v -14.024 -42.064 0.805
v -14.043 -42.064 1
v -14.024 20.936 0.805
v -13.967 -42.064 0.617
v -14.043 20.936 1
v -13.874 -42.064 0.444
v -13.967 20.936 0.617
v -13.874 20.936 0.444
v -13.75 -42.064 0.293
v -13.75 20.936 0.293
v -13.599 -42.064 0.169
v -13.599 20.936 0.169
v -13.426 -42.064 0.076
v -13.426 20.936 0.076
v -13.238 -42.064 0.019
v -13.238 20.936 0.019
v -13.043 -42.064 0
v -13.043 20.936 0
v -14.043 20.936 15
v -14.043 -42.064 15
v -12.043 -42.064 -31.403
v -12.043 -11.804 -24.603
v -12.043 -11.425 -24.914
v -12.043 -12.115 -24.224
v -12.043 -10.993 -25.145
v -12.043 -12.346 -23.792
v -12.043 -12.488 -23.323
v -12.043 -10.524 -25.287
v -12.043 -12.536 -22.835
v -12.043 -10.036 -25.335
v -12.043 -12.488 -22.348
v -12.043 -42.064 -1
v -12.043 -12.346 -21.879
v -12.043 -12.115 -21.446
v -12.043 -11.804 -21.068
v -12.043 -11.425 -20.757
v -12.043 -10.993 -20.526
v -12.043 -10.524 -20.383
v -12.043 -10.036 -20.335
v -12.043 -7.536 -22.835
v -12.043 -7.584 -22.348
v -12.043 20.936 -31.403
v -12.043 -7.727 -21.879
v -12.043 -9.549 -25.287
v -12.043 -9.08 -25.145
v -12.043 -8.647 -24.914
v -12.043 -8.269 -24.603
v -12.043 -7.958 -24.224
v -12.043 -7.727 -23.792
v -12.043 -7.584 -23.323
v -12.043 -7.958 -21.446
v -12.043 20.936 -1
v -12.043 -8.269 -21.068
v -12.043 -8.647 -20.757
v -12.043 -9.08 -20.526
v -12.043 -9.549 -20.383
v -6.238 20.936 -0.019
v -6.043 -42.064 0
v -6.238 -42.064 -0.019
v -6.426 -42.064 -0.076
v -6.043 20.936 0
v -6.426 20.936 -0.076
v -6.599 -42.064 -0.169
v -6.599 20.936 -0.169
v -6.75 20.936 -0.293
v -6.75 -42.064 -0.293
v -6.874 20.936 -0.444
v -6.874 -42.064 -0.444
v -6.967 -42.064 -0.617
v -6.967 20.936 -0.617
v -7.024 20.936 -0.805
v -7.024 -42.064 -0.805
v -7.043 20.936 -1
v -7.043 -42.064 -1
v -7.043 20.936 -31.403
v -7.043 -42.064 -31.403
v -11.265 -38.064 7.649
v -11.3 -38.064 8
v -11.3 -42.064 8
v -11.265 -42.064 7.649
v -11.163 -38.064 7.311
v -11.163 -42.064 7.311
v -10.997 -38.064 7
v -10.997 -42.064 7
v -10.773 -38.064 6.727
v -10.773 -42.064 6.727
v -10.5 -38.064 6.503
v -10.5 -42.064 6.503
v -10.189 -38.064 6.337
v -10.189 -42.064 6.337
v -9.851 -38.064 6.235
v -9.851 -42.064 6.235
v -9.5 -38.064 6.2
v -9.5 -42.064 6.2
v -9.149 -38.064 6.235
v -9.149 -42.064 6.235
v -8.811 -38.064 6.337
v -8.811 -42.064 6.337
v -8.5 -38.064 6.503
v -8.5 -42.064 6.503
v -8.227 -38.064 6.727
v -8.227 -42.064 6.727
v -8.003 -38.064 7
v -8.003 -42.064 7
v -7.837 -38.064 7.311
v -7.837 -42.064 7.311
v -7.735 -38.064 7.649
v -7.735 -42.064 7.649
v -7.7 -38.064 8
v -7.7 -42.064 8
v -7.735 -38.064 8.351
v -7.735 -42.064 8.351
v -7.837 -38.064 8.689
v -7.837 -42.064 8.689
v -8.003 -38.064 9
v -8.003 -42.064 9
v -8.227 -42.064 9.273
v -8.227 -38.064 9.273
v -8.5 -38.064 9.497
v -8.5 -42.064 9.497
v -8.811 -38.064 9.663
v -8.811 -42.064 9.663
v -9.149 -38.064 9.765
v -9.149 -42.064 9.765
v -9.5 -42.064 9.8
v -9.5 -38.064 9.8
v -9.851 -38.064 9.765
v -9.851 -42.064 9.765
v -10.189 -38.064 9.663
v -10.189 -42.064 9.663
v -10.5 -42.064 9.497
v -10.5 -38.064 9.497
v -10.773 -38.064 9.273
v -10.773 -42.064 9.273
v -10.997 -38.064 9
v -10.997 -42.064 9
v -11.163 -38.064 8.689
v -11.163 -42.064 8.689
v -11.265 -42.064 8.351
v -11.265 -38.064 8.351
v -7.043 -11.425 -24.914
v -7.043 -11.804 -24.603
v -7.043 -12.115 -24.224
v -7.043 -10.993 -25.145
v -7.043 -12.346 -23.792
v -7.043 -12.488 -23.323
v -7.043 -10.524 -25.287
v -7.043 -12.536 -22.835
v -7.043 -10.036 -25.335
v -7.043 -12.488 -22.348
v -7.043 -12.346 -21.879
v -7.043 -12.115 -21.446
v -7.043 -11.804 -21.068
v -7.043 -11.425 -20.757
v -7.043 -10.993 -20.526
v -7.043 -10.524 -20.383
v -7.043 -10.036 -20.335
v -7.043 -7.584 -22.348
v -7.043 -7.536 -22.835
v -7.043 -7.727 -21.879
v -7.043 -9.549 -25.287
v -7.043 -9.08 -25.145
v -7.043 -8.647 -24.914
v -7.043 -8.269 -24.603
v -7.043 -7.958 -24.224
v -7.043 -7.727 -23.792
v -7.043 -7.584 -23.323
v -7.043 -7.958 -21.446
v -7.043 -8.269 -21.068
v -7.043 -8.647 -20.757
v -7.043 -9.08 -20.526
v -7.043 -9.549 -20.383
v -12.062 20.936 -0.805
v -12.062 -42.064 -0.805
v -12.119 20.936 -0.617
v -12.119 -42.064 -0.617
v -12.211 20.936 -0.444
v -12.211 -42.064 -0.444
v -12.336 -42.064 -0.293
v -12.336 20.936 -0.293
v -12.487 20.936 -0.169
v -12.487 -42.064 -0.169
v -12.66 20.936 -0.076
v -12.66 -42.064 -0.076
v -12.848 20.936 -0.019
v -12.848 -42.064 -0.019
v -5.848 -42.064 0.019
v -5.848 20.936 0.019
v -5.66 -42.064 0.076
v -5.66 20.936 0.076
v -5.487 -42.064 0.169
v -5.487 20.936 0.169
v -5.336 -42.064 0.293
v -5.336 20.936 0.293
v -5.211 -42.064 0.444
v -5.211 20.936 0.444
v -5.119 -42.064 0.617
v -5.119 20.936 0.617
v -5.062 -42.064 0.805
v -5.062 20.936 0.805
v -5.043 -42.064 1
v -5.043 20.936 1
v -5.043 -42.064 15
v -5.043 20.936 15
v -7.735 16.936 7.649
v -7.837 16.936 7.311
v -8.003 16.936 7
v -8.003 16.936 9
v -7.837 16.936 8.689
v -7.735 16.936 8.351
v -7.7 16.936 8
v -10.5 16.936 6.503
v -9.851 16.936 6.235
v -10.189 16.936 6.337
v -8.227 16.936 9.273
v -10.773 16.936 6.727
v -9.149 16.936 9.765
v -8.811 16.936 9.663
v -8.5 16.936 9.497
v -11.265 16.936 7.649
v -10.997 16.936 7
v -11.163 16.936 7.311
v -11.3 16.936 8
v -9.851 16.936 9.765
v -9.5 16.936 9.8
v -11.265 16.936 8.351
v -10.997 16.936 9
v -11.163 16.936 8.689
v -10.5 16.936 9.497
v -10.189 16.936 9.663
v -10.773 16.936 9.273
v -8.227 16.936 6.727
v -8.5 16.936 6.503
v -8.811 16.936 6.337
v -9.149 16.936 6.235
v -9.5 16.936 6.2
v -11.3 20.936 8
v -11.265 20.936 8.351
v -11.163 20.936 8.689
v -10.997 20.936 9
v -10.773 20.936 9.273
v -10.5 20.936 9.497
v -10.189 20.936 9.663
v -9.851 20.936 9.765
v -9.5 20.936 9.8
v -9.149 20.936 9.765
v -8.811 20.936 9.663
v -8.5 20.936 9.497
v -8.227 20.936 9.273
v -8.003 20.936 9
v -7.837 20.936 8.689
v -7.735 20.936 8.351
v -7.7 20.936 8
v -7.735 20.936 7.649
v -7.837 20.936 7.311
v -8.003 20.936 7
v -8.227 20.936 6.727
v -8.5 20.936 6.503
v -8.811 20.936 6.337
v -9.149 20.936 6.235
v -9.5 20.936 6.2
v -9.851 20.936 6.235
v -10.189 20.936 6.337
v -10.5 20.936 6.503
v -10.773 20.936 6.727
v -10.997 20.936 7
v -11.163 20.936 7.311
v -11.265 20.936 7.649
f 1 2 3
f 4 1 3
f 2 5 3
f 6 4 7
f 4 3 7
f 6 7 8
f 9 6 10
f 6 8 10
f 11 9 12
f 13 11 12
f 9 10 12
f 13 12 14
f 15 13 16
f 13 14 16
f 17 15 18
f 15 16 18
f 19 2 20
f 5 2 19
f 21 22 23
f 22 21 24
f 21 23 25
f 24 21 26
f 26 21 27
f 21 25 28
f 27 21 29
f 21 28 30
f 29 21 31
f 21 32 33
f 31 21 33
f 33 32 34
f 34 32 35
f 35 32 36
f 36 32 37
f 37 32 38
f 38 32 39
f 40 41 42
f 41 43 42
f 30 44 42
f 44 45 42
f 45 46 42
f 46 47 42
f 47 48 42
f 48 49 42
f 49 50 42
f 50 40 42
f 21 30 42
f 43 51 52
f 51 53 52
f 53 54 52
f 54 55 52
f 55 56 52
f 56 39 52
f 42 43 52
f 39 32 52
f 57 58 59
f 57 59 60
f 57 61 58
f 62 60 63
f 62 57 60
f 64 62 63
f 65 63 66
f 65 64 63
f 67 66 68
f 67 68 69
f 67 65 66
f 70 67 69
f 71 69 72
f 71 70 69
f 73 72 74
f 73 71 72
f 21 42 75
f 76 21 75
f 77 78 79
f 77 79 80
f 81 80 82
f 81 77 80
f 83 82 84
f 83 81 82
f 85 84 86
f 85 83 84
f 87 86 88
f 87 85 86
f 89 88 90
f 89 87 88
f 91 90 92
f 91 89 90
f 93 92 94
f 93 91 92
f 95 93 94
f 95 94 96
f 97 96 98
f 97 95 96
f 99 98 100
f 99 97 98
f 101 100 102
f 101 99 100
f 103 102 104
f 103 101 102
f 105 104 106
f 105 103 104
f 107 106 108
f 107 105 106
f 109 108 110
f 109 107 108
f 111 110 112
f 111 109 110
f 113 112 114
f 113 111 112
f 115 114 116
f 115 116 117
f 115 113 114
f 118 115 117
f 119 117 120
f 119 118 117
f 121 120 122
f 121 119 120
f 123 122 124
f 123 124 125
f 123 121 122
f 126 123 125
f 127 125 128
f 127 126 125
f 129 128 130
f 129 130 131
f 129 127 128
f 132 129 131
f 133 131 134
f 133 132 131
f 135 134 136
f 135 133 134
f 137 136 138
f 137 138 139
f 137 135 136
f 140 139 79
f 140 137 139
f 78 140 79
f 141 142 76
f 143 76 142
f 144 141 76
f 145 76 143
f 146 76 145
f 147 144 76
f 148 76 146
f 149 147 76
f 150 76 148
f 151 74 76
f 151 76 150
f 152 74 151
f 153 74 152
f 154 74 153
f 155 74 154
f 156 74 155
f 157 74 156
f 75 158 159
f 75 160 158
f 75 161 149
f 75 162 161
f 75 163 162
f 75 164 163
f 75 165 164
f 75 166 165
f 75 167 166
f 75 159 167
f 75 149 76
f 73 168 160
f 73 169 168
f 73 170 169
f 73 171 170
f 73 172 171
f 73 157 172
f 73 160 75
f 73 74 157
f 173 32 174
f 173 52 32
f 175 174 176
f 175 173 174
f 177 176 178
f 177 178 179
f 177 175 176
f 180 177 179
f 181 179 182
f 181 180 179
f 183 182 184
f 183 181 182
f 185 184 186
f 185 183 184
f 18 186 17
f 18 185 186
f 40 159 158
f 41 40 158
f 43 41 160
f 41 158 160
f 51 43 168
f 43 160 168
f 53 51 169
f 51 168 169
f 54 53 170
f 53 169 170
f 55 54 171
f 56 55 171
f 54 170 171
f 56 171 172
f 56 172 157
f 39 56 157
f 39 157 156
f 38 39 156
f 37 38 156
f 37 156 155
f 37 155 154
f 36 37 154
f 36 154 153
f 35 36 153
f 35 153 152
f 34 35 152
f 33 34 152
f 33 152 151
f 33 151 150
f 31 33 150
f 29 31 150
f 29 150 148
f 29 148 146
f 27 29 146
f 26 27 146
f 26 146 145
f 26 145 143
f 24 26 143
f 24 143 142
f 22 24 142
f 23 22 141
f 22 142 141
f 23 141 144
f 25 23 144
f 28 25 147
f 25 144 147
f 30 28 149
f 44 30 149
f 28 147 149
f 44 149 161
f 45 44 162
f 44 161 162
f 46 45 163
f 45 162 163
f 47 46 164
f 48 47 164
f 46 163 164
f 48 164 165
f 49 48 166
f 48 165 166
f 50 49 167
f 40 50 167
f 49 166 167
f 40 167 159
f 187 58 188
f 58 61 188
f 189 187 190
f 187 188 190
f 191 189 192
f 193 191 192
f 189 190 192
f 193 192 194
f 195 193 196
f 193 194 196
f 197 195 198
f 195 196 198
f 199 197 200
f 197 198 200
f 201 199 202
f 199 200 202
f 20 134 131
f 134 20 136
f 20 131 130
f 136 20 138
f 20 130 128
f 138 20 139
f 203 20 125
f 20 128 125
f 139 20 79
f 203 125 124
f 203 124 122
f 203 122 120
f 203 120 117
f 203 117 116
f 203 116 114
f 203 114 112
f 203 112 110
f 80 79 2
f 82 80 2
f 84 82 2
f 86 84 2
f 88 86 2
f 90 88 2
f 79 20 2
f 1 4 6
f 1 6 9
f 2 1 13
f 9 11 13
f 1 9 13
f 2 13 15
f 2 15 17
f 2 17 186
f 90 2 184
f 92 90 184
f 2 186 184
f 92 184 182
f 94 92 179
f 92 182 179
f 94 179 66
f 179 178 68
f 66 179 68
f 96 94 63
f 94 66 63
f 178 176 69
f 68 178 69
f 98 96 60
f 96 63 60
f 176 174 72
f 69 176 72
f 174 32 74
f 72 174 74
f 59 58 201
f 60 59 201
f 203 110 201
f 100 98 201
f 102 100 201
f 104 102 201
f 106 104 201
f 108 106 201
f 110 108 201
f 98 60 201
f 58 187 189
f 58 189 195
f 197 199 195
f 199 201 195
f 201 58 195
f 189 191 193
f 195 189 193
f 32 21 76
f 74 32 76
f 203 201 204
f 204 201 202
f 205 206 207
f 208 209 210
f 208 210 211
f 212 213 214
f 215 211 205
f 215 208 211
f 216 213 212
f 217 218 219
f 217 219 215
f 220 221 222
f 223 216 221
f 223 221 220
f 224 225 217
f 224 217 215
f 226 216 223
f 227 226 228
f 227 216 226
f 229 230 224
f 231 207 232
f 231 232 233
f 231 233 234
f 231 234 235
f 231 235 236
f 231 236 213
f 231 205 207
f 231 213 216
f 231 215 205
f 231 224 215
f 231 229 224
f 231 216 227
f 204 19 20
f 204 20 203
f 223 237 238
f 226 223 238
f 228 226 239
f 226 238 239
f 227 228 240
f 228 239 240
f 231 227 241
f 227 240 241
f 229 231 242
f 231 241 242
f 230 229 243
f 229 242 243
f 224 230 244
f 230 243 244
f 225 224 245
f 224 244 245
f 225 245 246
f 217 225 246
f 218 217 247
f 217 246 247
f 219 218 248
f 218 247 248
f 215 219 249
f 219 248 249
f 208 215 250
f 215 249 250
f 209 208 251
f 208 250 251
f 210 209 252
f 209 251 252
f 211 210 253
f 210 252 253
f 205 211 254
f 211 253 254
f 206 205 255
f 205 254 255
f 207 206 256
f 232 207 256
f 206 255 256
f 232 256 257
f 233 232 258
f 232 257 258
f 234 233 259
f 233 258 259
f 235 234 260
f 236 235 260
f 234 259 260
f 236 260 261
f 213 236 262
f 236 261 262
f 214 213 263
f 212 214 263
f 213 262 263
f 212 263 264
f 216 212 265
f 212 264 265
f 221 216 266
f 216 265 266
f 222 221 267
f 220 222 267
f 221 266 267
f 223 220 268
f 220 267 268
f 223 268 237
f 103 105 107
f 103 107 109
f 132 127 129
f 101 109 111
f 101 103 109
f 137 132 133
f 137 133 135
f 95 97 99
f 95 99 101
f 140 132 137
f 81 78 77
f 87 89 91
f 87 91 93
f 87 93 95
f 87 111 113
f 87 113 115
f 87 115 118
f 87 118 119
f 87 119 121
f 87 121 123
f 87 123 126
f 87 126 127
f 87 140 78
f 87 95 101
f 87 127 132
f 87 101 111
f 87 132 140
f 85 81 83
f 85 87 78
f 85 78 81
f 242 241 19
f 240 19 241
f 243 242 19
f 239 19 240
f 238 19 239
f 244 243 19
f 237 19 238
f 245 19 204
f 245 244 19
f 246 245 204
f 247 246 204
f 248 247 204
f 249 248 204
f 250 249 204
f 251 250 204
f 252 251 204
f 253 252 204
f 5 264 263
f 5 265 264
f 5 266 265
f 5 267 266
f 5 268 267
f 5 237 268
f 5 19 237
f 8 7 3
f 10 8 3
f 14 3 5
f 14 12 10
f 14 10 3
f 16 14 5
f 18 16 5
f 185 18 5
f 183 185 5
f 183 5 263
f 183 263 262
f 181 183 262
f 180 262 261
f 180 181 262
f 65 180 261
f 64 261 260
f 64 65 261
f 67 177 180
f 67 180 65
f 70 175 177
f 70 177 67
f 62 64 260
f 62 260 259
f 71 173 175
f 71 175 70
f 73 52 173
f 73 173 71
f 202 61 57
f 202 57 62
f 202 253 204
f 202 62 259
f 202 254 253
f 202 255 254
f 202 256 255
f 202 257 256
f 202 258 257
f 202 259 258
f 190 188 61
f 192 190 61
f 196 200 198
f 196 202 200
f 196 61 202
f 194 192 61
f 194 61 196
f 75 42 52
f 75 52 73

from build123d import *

# Parameters (mm, degrees)
ESQUISSE1_W                  = 9
ESQUISSE1_H                  = 63
BOSS_EXTRU_1_DEPTH           = 10
ESQUISSE2_W                  = 5
ESQUISSE2_H                  = 63
BOSS_EXTRU_2_DEPTH           = 63
CONG_3_R                     = 1
CONG_4_R                     = 1
CONG_5_R                     = 1
CONG_6_R                     = 1
ESQUISSE3_R                  = 2.5
ENL_V_MAT_EXTRU_1_DEPTH      = 77.075062882
ENL_V_MAT_EXTRU_3_DEPTH      = 77.075062882
ENL_V_MAT_EXTRU_3_DEPTH_BACK = 77.075062882
ESQUISSE9_R                  = 2.5
ENL_V_MAT_EXTRU_4_DEPTH      = 23
ESQUISSE12_W                 = 9
ESQUISSE12_H                 = 63
BOSS_EXTRU_4_DEPTH           = 5
ESQUISSE13_R                 = 1.8
ENL_V_MAT_EXTRU_6_DEPTH      = 4
ENL_V_START                  = -4
ESQUISSE14_R                 = 1.8
ENL_V_MAT_EXTRU_7_DEPTH      = 4


with BuildPart() as part:
    # Esquisse1 → Boss.-Extru.1 (new body)
    with BuildSketch(Plane.XY):
        with Locations((-9.542944785, -10.564417178)):
            Rectangle(ESQUISSE1_W, ESQUISSE1_H)
    extrude(amount=BOSS_EXTRU_1_DEPTH)

    # Esquisse2 → Boss.-Extru.2 (add)
    with BuildSketch(Plane(origin=(0, 0, 0), x_dir=(-1, 0, 0), z_dir=(0, 0, -1))):
        with Locations((9.542944785, -10.564417178)):
            Rectangle(ESQUISSE2_W, ESQUISSE2_H)
    extrude(amount=BOSS_EXTRU_2_DEPTH)

    # Congé3
    cong_3_edges = [part.edges().sort_by_distance(p)[0] for p in [
        (-7.042944785, -10.564417178, 0),
    ]]
    fillet(cong_3_edges, radius=CONG_3_R)

    # Congé4
    cong_4_edges = [part.edges().sort_by_distance(p)[0] for p in [
        (-12.042944785, -10.564417178, 0),
    ]]
    fillet(cong_4_edges, radius=CONG_4_R)

    # Congé5
    cong_5_edges = [part.edges().sort_by_distance(p)[0] for p in [
        (-5.042944785, -10.564417178, 0),
    ]]
    fillet(cong_5_edges, radius=CONG_5_R - 0.0001)  # a hair under: the kernel refuses the full size

    # Congé6
    cong_6_edges = [part.edges().sort_by_distance(p)[0] for p in [
        (-14.042944785, -10.564417178, 0),
    ]]
    fillet(cong_6_edges, radius=CONG_6_R - 0.0001)  # a hair under: the kernel refuses the full size

    # Esquisse3 → Enlèv. mat.-Extru.1 (cut, through all)
    with BuildSketch(Plane.ZY.offset(12.042944785)):
        with Locations(Location((-43, -10.564417178, 0), (0, 0, 270))):
            Circle(ESQUISSE3_R)
    extrude(amount=-ENL_V_MAT_EXTRU_1_DEPTH, mode=Mode.SUBTRACT)

    # Esquisse7 → Enlèv. mat.-Extru.3 (cut, two sides: drawn at the far end of the back side and taken through both)
    with BuildSketch(Plane(origin=(-7.042944785, 0, 0), x_dir=(0, 0, -1), z_dir=(1, 0, 0)).offset(-ENL_V_MAT_EXTRU_3_DEPTH_BACK)):
        Polygon((51.248405369, 207.781395644), (51.248405369, 20.935582822), (51.248405369, -42.839359106), (51.248405369, -229.685171928), (424.940031013, -229.685171928), (424.940031013, 207.781395644), align=None)
    extrude(amount=ENL_V_MAT_EXTRU_3_DEPTH + ENL_V_MAT_EXTRU_3_DEPTH_BACK, mode=Mode.SUBTRACT)


with BuildPart() as body_2:
    # Fractionner1: the piece on the far side of the plane
    add(part.part)
    split(bisect_by=Plane.XY.offset(-31.402624734), keep=Keep.BOTTOM)


with BuildPart() as part_1:
    add(part.part)

    # Fractionner1
    split(bisect_by=Plane.XY.offset(-31.402624734), keep=Keep.TOP)

    # Esquisse9 → Enlèv. mat.-Extru.4 (cut)
    with BuildSketch(Plane(origin=(-7.042944785, 0, 0), x_dir=(0, 0, -1), z_dir=(1, 0, 0))):
        with Locations(Location((22.835321424, -10.036411033, 0), (0, 0, 90))):
            Circle(ESQUISSE9_R)
    extrude(amount=-ENL_V_MAT_EXTRU_4_DEPTH, mode=Mode.SUBTRACT)

    # Esquisse12 → Boss.-Extru.4 (add)
    with BuildSketch(Plane.XY.offset(10)):
        with Locations((-9.542944785, -10.564417178)):
            Rectangle(ESQUISSE12_W, ESQUISSE12_H)
    extrude(amount=BOSS_EXTRU_4_DEPTH)

    # Esquisse13 → Enlèv. mat.-Extru.6 (cut)
    with BuildSketch(Plane(origin=(0, 20.935582822, 0), x_dir=(1, 0, 0), z_dir=(0, 1, 0))):
        with Locations(Location((-9.5, -8, 0), (0, 0, 180))):
            Circle(ESQUISSE13_R)
    extrude(amount=-ENL_V_MAT_EXTRU_6_DEPTH, mode=Mode.SUBTRACT)

    # Esquisse14 → Enlèv. mat.-Extru.7 (cut)
    with BuildSketch(Plane(origin=(0, -42.064417178, 0), x_dir=(-1, 0, 0), z_dir=(0, -1, 0)).offset(ENL_V_START)):
        with Locations((9.5, -8)):
            Circle(ESQUISSE14_R)
    extrude(amount=ENL_V_MAT_EXTRU_7_DEPTH, mode=Mode.SUBTRACT)


solid = part_1.part
